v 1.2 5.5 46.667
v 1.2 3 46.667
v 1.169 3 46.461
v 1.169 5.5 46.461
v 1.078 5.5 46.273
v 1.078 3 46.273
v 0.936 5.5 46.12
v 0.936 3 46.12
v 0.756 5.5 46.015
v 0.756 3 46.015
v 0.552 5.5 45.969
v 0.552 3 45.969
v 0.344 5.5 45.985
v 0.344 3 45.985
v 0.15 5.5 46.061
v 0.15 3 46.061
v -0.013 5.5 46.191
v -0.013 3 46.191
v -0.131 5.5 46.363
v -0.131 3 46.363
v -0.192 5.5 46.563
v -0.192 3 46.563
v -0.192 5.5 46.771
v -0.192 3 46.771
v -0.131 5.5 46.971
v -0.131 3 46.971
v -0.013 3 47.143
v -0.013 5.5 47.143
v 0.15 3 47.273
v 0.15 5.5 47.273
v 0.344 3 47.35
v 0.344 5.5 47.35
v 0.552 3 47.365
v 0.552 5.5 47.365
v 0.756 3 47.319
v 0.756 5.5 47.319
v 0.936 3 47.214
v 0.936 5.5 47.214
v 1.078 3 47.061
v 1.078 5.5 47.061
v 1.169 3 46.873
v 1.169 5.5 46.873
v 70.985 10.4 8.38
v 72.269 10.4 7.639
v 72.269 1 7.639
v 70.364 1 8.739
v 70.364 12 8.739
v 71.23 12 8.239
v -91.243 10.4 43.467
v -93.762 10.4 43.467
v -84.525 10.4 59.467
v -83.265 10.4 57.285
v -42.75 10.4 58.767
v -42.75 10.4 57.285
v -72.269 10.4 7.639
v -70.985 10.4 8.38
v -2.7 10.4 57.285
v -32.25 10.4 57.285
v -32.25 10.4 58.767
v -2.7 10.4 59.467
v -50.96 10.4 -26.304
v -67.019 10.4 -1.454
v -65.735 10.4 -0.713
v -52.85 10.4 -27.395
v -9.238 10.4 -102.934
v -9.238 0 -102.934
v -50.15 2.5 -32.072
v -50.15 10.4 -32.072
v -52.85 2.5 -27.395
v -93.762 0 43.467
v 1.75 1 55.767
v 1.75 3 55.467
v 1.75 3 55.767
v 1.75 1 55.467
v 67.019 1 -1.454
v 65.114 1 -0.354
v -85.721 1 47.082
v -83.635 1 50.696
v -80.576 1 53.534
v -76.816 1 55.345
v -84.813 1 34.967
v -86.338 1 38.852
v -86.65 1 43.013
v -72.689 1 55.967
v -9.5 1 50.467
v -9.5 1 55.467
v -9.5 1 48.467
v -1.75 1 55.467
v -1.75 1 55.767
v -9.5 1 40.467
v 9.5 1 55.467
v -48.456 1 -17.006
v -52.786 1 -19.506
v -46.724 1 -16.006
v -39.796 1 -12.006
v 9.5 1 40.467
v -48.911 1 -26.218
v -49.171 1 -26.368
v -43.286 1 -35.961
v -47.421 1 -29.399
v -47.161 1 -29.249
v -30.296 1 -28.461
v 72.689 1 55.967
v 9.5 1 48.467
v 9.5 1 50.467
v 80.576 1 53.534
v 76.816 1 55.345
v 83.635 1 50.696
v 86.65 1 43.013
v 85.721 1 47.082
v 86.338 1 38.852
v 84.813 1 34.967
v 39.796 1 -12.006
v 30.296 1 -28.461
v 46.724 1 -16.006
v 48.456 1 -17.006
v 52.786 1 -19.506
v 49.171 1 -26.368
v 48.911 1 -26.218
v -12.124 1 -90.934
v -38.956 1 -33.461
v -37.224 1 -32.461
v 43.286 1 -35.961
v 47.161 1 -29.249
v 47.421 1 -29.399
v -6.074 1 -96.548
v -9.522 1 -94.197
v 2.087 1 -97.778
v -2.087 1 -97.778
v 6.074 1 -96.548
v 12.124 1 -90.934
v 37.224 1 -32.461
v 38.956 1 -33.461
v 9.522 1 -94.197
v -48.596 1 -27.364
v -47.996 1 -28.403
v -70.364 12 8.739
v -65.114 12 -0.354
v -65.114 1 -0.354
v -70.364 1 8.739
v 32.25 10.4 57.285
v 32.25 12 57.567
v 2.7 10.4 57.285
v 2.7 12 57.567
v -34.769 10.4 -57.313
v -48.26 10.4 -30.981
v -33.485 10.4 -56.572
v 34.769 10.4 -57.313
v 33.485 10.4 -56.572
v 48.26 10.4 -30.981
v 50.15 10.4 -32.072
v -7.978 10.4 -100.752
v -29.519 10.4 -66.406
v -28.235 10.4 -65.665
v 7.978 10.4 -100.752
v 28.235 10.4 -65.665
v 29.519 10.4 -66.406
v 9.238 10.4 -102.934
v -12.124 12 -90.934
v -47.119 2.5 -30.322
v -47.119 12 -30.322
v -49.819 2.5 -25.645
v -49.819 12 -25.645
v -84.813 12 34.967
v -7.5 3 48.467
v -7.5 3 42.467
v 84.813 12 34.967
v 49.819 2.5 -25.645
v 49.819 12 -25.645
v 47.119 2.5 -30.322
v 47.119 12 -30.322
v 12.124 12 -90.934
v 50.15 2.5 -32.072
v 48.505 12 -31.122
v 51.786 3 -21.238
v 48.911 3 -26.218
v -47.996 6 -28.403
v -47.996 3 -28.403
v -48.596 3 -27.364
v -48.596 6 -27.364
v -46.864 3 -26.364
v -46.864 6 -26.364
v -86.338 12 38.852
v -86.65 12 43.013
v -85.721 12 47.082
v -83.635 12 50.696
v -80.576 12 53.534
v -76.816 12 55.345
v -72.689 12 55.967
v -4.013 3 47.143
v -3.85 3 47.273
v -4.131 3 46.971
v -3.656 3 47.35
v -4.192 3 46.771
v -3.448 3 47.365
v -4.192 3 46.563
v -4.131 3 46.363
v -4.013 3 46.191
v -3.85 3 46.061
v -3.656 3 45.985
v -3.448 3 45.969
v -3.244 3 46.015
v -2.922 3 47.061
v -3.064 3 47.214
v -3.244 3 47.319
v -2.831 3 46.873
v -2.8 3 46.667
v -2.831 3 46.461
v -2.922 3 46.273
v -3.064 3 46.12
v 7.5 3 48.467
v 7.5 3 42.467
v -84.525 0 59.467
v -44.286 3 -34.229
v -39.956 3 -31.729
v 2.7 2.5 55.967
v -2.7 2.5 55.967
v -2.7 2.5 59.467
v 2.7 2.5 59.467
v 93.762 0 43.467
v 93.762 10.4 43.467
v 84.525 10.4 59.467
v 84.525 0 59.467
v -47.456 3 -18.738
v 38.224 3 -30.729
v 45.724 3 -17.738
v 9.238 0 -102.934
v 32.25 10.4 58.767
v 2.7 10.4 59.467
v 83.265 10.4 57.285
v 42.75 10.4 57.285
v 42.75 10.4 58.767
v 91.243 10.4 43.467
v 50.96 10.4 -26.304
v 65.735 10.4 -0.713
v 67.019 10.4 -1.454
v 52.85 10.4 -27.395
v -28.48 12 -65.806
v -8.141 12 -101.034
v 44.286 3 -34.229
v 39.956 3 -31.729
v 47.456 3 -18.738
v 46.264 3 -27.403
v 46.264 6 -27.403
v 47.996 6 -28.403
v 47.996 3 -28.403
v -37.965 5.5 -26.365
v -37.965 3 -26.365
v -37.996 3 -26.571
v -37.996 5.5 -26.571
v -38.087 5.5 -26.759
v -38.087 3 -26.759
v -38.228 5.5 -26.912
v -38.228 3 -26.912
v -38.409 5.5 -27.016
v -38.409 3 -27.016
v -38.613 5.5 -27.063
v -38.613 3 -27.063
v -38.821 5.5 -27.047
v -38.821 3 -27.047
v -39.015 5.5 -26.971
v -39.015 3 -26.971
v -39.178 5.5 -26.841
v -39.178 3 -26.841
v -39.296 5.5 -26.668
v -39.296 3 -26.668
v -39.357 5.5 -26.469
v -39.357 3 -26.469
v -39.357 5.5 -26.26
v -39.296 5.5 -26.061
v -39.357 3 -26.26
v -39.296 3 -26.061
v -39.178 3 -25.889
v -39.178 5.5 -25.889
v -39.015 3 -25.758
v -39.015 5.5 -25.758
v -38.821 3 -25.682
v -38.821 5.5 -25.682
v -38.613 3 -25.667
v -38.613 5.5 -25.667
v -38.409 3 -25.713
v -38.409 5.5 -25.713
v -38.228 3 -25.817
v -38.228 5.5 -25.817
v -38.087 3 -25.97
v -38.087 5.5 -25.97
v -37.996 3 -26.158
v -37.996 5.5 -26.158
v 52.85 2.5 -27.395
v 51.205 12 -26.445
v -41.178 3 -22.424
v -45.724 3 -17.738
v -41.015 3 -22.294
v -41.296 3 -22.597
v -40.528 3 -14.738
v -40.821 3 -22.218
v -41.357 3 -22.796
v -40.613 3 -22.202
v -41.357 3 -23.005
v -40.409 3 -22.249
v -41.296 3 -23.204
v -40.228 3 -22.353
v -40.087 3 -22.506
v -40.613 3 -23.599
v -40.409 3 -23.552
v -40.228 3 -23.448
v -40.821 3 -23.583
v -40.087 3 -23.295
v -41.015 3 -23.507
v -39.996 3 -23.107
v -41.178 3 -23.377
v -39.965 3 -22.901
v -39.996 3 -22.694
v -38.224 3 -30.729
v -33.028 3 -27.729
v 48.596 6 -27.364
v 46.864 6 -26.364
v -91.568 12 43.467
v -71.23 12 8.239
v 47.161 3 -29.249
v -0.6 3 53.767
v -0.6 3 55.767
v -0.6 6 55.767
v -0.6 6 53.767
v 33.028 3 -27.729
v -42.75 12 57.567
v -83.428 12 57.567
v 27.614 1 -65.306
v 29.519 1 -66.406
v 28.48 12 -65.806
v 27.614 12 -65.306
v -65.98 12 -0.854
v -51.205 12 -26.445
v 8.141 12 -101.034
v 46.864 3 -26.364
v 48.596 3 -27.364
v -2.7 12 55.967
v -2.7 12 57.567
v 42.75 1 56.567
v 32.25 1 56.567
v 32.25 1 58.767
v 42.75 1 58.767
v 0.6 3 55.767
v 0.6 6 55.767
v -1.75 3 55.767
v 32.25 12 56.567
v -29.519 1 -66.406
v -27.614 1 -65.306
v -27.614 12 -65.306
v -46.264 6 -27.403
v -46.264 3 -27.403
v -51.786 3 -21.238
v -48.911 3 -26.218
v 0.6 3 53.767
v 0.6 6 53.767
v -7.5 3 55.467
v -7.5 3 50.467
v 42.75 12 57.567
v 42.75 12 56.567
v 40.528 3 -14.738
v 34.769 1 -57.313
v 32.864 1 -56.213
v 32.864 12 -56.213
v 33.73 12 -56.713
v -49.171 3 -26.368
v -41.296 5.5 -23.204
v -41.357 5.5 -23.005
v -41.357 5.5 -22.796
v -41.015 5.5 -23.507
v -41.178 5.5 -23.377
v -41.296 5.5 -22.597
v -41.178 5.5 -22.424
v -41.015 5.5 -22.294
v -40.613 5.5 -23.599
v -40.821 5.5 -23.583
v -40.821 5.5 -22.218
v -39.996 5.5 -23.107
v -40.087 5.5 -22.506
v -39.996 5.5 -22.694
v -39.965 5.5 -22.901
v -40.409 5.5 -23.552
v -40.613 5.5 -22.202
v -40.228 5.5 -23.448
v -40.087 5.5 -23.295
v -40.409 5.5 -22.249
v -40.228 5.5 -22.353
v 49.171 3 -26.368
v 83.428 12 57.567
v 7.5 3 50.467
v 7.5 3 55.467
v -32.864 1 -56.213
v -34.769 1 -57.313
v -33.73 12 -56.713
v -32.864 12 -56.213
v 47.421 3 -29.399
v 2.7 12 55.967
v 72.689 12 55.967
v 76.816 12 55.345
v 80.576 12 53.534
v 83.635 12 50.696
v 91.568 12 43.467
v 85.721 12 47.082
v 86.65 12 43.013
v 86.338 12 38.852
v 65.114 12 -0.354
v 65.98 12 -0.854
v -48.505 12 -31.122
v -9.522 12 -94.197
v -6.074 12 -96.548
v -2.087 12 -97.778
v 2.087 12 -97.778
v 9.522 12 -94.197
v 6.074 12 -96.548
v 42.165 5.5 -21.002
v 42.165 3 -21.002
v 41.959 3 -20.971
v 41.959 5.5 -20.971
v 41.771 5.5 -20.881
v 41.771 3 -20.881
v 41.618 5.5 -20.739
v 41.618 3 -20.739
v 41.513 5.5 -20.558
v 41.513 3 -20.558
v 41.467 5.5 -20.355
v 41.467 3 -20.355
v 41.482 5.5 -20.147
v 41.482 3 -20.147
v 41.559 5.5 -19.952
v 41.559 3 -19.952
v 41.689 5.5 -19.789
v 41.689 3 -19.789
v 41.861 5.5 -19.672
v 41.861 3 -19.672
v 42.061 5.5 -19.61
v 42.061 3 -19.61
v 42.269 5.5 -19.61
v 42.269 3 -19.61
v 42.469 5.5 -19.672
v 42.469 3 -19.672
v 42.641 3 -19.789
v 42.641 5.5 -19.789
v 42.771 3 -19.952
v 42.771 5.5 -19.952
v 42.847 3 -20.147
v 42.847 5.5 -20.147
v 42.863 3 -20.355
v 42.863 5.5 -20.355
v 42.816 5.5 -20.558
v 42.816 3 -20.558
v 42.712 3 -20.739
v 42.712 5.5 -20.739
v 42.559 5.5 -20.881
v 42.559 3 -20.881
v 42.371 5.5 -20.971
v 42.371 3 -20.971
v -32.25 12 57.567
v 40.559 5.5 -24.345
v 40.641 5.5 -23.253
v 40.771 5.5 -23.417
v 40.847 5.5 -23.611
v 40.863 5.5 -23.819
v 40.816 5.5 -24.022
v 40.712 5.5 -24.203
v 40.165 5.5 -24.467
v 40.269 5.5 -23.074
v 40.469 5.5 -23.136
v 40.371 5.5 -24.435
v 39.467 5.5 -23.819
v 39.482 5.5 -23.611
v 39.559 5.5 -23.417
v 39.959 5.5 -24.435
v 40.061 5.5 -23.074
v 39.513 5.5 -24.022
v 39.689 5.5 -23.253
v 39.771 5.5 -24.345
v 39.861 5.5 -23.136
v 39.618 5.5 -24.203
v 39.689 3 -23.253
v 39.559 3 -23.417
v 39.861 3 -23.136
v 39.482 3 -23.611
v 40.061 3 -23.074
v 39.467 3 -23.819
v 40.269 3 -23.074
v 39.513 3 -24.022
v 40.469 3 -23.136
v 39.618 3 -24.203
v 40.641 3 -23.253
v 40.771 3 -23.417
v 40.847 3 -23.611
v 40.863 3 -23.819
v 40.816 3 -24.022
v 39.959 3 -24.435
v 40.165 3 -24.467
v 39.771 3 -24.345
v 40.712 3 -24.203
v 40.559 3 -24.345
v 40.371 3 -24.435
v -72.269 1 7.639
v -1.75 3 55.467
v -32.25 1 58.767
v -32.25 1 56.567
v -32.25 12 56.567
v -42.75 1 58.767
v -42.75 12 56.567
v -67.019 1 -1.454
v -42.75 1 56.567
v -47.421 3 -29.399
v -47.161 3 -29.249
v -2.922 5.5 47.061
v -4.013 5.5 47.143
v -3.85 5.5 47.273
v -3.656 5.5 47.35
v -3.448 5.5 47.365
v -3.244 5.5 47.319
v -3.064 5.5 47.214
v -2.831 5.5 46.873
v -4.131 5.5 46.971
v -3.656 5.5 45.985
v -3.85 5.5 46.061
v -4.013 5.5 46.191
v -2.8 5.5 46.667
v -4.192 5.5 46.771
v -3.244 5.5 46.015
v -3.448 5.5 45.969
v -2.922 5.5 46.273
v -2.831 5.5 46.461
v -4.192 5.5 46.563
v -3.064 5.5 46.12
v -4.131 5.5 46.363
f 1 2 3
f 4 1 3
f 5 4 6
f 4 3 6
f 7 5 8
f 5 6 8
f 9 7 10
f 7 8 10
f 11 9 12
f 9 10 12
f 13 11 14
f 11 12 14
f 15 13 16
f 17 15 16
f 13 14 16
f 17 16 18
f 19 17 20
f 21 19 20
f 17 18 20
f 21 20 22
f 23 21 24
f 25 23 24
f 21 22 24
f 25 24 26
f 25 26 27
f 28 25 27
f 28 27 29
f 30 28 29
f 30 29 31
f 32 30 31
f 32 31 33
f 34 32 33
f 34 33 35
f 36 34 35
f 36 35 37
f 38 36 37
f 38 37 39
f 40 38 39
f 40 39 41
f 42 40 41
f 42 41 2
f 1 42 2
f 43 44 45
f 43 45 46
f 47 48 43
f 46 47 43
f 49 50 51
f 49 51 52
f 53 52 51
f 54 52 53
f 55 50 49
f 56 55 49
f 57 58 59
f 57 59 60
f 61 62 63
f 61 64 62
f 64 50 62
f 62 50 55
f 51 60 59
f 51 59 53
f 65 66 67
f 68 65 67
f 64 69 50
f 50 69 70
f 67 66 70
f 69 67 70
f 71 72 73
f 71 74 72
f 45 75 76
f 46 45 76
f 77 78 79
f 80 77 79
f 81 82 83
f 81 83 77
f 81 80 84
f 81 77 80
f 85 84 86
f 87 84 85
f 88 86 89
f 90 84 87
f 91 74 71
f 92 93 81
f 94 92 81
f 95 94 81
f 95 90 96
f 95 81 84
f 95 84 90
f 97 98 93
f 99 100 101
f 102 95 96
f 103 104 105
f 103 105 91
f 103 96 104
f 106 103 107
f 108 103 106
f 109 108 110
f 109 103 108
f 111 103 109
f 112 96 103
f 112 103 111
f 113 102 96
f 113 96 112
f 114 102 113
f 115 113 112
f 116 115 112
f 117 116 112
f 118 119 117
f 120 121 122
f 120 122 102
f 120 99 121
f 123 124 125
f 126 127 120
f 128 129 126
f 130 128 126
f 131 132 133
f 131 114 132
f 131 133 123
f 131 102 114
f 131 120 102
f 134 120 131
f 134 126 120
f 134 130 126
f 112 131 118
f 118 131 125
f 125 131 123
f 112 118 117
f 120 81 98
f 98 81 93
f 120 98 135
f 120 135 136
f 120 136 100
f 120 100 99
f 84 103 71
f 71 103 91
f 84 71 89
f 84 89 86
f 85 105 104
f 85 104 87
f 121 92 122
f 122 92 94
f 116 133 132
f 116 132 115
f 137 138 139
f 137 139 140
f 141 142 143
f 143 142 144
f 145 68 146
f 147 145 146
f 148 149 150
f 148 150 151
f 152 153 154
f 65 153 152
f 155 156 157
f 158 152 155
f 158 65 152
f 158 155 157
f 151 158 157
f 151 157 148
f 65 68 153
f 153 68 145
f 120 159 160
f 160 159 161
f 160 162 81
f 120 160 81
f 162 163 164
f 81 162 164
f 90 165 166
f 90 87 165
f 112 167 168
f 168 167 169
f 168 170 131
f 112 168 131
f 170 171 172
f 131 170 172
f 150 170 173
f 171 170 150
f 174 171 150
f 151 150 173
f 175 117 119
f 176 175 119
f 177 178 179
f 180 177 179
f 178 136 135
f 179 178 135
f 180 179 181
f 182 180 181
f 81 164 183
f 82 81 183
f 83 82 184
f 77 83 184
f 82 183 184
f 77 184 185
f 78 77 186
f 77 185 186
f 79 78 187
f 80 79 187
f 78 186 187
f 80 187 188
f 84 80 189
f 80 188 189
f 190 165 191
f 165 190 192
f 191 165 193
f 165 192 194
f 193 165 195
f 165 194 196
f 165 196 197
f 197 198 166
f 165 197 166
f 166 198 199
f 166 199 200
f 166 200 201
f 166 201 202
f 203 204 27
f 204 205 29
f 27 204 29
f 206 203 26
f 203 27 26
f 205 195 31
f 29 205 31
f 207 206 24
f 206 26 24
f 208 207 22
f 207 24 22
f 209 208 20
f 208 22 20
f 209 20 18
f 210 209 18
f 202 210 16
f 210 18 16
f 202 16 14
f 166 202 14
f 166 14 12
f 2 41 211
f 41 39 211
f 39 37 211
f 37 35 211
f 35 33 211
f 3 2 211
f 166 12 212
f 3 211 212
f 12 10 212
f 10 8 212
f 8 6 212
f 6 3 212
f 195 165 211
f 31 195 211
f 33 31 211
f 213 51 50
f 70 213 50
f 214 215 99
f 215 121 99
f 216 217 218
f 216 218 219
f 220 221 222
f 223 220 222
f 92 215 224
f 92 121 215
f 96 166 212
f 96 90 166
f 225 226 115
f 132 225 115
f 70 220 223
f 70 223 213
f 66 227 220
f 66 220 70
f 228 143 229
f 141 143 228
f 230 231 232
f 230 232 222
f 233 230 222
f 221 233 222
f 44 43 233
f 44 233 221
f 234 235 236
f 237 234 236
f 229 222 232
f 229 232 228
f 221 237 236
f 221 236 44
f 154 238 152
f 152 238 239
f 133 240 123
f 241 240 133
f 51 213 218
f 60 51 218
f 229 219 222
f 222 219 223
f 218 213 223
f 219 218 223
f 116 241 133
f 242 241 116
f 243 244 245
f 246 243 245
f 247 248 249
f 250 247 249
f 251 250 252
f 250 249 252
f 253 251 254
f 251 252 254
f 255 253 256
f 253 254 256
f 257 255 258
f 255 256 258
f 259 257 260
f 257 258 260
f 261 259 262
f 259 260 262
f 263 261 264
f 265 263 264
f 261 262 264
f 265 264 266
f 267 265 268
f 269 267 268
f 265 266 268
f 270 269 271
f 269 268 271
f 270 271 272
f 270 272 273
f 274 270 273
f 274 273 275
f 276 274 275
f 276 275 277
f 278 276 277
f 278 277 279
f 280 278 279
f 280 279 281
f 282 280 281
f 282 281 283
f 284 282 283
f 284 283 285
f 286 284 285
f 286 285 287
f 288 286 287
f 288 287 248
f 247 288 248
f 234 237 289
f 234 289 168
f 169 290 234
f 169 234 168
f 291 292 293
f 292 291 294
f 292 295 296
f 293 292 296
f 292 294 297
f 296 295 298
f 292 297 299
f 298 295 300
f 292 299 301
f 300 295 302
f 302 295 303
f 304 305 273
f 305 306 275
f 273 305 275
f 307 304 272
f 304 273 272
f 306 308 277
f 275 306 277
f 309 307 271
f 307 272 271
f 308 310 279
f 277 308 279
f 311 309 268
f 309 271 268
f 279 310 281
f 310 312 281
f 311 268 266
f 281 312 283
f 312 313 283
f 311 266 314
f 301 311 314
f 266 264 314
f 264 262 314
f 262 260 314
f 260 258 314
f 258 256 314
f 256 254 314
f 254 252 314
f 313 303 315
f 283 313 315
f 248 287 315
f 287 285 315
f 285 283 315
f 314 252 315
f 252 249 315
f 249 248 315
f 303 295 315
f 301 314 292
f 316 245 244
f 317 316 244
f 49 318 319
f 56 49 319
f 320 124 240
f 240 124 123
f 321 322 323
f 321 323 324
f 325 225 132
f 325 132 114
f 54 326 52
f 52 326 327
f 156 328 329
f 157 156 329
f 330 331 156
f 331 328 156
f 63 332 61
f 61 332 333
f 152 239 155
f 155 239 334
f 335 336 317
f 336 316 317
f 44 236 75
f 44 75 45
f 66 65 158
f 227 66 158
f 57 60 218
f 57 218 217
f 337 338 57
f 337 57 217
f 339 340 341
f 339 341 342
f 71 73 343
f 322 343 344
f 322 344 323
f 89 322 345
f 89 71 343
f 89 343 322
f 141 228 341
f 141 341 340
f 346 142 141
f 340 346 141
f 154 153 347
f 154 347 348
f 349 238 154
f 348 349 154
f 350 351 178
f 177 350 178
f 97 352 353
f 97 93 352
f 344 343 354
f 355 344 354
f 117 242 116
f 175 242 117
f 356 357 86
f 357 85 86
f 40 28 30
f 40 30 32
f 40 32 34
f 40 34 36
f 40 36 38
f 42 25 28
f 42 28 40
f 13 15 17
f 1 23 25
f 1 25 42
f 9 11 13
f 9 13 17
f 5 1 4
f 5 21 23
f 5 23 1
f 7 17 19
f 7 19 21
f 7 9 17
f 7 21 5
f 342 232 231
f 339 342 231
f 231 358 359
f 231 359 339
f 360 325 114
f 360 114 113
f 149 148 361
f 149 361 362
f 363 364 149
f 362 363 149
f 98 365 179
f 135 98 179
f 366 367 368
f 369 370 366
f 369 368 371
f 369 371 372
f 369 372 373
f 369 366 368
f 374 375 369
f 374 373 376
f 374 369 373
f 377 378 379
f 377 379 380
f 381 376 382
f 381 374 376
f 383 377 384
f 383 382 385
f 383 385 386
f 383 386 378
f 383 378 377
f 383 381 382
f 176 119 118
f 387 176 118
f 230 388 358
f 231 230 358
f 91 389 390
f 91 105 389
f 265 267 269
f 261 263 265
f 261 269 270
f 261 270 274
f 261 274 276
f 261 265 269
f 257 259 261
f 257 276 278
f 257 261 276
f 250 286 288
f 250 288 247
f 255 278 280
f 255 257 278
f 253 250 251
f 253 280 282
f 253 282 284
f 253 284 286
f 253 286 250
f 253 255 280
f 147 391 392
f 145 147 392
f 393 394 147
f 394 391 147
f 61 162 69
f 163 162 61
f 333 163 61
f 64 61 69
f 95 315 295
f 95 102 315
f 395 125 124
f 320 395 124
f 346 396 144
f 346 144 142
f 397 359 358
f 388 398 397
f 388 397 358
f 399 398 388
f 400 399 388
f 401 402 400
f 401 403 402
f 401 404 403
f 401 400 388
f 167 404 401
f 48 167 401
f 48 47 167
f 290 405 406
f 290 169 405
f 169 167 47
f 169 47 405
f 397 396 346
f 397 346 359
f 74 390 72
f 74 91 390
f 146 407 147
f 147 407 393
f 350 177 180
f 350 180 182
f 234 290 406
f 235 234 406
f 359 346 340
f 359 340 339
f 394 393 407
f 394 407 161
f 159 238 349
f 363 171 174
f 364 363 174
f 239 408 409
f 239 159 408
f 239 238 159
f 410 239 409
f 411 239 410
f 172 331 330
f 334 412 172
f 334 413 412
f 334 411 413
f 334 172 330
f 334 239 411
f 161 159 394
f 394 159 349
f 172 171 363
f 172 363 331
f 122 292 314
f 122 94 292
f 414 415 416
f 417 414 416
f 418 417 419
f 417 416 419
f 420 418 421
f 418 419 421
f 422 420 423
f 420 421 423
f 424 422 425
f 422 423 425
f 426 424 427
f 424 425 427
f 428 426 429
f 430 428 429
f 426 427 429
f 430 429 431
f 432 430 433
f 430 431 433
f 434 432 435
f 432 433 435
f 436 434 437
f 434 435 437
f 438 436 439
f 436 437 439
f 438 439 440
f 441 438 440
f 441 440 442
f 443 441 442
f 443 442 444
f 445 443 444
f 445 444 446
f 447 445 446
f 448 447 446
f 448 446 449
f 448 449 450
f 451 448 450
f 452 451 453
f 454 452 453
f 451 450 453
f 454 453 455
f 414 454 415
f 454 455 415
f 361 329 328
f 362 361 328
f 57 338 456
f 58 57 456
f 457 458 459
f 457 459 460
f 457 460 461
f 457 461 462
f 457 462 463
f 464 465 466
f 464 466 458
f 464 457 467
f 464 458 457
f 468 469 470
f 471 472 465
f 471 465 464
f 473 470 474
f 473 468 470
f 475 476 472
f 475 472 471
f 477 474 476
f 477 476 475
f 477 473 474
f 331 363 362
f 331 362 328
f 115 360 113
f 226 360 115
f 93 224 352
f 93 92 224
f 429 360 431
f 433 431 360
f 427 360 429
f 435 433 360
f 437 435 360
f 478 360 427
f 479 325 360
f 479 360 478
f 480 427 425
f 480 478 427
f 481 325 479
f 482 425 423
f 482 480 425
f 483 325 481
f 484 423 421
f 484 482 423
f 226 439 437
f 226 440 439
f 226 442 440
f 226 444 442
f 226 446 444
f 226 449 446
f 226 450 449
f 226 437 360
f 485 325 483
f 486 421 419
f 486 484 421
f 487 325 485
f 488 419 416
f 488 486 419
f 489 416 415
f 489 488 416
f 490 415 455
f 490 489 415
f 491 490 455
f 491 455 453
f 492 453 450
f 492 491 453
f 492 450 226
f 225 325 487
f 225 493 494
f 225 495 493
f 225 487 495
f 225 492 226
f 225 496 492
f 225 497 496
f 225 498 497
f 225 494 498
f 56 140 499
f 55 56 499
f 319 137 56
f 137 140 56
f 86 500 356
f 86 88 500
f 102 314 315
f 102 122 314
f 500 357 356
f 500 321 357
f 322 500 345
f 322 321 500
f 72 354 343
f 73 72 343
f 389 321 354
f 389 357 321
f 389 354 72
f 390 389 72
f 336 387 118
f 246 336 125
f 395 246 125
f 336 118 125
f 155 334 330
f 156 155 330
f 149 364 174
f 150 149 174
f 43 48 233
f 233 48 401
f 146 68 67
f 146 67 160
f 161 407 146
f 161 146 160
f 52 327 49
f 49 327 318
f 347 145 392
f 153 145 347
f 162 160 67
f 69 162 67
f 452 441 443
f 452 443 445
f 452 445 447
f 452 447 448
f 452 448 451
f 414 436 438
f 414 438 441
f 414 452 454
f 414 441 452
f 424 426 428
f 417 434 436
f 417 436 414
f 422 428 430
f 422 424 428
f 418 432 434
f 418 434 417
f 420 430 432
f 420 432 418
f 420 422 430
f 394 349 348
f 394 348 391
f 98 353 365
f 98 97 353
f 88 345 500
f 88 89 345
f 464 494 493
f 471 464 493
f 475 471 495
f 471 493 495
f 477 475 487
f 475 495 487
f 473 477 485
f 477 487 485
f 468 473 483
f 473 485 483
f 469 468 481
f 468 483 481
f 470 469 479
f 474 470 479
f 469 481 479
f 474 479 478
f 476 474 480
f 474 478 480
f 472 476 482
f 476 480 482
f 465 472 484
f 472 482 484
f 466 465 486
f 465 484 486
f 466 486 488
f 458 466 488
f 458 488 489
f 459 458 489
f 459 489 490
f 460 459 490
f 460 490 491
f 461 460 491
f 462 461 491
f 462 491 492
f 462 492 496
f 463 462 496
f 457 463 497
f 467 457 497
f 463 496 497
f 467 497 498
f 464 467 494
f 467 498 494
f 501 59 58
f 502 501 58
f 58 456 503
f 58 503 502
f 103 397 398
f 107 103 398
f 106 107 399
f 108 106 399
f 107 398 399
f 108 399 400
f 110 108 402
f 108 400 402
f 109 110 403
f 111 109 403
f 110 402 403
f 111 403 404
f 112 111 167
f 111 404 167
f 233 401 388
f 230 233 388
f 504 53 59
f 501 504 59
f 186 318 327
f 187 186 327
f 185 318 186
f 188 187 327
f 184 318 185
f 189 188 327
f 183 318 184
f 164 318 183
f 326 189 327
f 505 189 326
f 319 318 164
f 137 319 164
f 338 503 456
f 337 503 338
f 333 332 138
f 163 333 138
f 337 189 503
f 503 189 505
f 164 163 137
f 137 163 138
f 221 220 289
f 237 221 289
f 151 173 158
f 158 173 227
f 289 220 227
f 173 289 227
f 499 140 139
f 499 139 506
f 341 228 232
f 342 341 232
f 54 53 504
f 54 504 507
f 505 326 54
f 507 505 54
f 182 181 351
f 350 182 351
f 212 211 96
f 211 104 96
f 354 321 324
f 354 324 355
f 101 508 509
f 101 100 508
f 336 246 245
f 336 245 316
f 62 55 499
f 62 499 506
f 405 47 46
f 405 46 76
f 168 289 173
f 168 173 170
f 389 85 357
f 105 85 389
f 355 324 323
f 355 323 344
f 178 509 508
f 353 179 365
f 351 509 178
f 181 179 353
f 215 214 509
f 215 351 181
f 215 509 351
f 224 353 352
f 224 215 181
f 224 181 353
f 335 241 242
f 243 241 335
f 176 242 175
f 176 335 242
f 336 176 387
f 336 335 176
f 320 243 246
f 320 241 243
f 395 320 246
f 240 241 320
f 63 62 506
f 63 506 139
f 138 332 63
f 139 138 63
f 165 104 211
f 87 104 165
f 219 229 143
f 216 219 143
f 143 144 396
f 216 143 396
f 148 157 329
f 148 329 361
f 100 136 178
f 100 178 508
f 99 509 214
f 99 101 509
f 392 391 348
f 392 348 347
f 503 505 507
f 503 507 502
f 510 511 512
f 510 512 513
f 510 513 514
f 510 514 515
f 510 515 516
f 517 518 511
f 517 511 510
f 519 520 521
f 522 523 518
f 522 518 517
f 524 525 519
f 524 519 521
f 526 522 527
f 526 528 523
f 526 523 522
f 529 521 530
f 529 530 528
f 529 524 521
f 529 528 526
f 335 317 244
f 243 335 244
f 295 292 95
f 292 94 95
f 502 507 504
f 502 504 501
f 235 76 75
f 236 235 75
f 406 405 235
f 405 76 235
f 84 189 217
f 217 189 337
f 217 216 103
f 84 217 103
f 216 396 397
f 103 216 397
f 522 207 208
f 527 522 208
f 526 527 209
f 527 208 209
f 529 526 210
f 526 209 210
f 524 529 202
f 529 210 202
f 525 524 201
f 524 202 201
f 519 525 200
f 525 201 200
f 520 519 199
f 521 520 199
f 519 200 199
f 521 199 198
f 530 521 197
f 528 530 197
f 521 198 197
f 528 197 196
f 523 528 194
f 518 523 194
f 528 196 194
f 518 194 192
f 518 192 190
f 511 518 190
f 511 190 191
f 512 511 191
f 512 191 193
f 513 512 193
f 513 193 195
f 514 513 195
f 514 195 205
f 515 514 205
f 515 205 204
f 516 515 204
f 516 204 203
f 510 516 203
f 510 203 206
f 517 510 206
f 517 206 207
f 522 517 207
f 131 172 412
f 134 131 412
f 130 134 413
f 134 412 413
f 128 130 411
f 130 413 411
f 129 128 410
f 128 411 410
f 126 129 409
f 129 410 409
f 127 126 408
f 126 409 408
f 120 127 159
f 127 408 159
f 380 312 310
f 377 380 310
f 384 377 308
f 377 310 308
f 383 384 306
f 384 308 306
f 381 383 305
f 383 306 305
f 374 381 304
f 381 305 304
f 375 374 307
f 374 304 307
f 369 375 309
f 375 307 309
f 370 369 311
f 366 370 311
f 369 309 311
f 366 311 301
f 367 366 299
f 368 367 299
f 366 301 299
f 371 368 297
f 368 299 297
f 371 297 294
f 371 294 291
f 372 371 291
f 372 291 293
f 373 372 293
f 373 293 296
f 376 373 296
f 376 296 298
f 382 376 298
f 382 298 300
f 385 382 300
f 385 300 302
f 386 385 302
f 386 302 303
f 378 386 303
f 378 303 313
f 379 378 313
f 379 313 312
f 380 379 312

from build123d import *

# Parameters (mm, degrees)
BOSS_EXTRU_1_DEPTH                        = 12
ENL_V_MAT_EXTRU_1_DEPTH                   = 158.792057257
ENL_V_MAT_EXTRU_2_DEPTH                   = 11
ESQUISSE4_W                               = 5.4
ESQUISSE4_H                               = 3.5
ENL_V_MAT_EXTRU_3_DEPTH                   = 9.5
BOSS_EXTRU_2_DEPTH                        = 2
ESQUISSE13_R                              = 0.7
BOSS_EXTRU_3_DEPTH                        = 2.5
BOSS_EXTRU_8_DEPTH                        = 3
CHANFREIN4_SIZE                           = 2
ENL_V_MAT_EXTRU_11_DEPTH                  = 2
R_P_TITION_START                          = 1
R_P_TITION_CIRCULAIRE1_OUTLINE_W          = 1.2
R_P_TITION_CIRCULAIRE1_OUTLINE_H          = 2
R_P_TITION_CIRCULAIRE1_OUTLINE_R          = 0.7
R_P_TITION_CIRCULAIRE1_DEPTH              = 4.5
R_P_TITION_START_2                        = 5.5
R_P_TITION_CIRCULAIRE1_2_OUTLINE_W        = 1.2
R_P_TITION_CIRCULAIRE1_2_OUTLINE_H        = 2
R_P_TITION_CIRCULAIRE1_2_DEPTH            = 0.5
ENL_V_DE_MAT_EXTRU_MINCE1_DEPTH           = 1.6
ENL_V_DE_MAT_EXTRU_MINCE1_DRAFT           = 10
ENL_V_DE_MAT_EXTRU_MINCE1_PROFILE_2_DEPTH = 1.6
ENL_V_DE_MAT_EXTRU_MINCE1_PROFILE_2_DRAFT = 10
ENL_V_DE_MAT_EXTRU_MINCE1_PROFILE_3_DEPTH = 1.6
ENL_V_DE_MAT_EXTRU_MINCE1_PROFILE_3_DRAFT = 10
ESQUISSE18_W                              = 10.5
ESQUISSE18_H                              = 2.2
ENL_V_MAT_EXTRU_10_DEPTH                  = 11


with BuildPart() as part:
    # Esquisse1 → Boss.-Extru.1 (new body)
    with BuildSketch(Plane(origin=(0, 0, 0), x_dir=(1, 0, 0), z_dir=(0, 1, 0))):
        Polygon((-103, -59.467077727), (103, -59.467077727), (0, 118.934155453), align=None)
    extrude(amount=BOSS_EXTRU_1_DEPTH)

    # Esquisse2 → Enlèv. mat.-Extru.1 (cut, through all)
    with BuildSketch(Plane(origin=(0, 12, 0), x_dir=(1, 0, 0), z_dir=(0, 1, 0))):
        Polygon((-9.237604307, 102.934155453), (9.237604307, 102.934155453), (0, 118.934155453), align=None)
        Polygon((103, -59.467077727), (93.762395693, -43.467077727), (84.524791386, -59.467077727), align=None)
        Polygon((-103, -59.467077727), (-84.524791386, -59.467077727), (-93.762395693, -43.467077727), align=None)
    extrude(amount=-ENL_V_MAT_EXTRU_1_DEPTH, mode=Mode.SUBTRACT)

    # Esquisse3 → Enlèv. mat.-Extru.2 (cut)
    with BuildSketch(Plane(origin=(0, 12, 0), x_dir=(1, 0, 0), z_dir=(0, 1, 0))):
        with BuildLine():
            Line((84.813466521, -34.967077727), (12.124355653, 90.934155453))
            ThreePointArc((12.124355653, 90.934155453), (0, 97.934155453), (-12.124355653, 90.934155453))
            Line((-12.124355653, 90.934155453), (-84.813466521, -34.967077727))
            ThreePointArc((-84.813466521, -34.967077727), (-84.813466521, -48.967077727), (-72.689110868, -55.967077727))
            Line((-72.689110868, -55.967077727), (72.689110868, -55.967077727))
            ThreePointArc((72.689110868, -55.967077727), (84.813466521, -48.967077727), (84.813466521, -34.967077727))
        make_face()
    extrude(amount=-ENL_V_MAT_EXTRU_2_DEPTH, mode=Mode.SUBTRACT)

    # Esquisse4 → Enlèv. mat.-Extru.3 (cut)
    with BuildSketch(Plane(origin=(0, 12, 0), x_dir=(1, 0, 0), z_dir=(0, 1, 0))):
        Polygon((49.818911087, 25.645270273), (47.118911087, 30.321807453), (50.15, 32.071807453), (52.85, 27.395270273), align=None)
        with Locations((0, -57.717077727)):
            Rectangle(ESQUISSE4_W, ESQUISSE4_H)
        Polygon((-50.15, 32.071807453), (-47.118911087, 30.321807453), (-49.818911087, 25.645270273), (-52.85, 27.395270273), align=None)
    extrude(amount=-ENL_V_MAT_EXTRU_3_DEPTH, mode=Mode.SUBTRACT)

    # Esquisse12 → Boss.-Extru.2 (add)
    with BuildSketch(Plane(origin=(0, 1, 0), x_dir=(1, 0, 0), z_dir=(0, 1, 0))):
        Polygon((33.027568136, 27.728729392), (40.527568136, 14.738348335), (51.785898385, 21.238348335), (48.910898385, 26.217994407), (49.170706006, 26.367994407), (47.420706006, 29.39908332), (47.160898385, 29.24908332), (44.285898385, 34.228729392), align=None)
    extrude(amount=BOSS_EXTRU_2_DEPTH)

    # Esquisse13 → Boss.-Extru.3 (add)
    with BuildSketch(Plane(origin=(0, 3, 0), x_dir=(1, 0, 0), z_dir=(0, 1, 0))):
        with Locations(Location((40.164874832, 23.766551565, 0), (0, 0, 90))):
            Circle(ESQUISSE13_R)
        with Locations(Location((42.164874832, 20.30244995, 0), (0, 0, 90))):
            Circle(ESQUISSE13_R)
    extrude(amount=BOSS_EXTRU_3_DEPTH)

    # Esquisse20 → Boss.-Extru.8 (add, symmetric)
    with BuildSketch(Plane(origin=(0, 3, 0), x_dir=(1, 0, 0), z_dir=(0, 1, 0))):
        Polygon((47.995706006, 28.403154106), (48.595706006, 27.363923621), (46.863655198, 26.363923621), (46.263655198, 27.403154106), align=None)
    extrude(amount=BOSS_EXTRU_8_DEPTH, both=True)

    # Chanfrein4
    chanfrein4_edges = [part.edges().sort_by_distance(p)[0] for p in [
        (38.65673326, 1, -30.978729392),
        (36.777568136, 1, -21.233538863),
        (46.15673326, 1, -17.988348335),
    ]]
    chamfer(chanfrein4_edges, length=CHANFREIN4_SIZE - 0.0001)  # a hair under: the kernel refuses the full size

    # Esquisse21 → Enlèv. mat.-Extru.11 (cut)
    with BuildSketch(Plane(origin=(0, 3, 0), x_dir=(1, 0, 0), z_dir=(0, 1, 0))):
        Polygon((37.223720558, 32.460780199), (38.955771366, 33.460780199), (48.455771366, 17.006297527), (46.723720558, 16.006297527), align=None)
    extrude(amount=-ENL_V_MAT_EXTRU_11_DEPTH, mode=Mode.SUBTRACT)

    # Répétition circulaire1: read off the stored shape, not the designer's step
    # Répétition circulaire1 outline → Répétition circulaire1 (add)
    with BuildSketch(Plane(origin=(0, 0, 0), x_dir=(1, 0, 0), z_dir=(0, 1, 0)).offset(R_P_TITION_START)):
        Polygon((-47.995706006, 28.403154106), (-48.595706006, 27.363923621), (-46.863655198, 26.363923621), (-46.263655198, 27.403154106), align=None)
        with Locations((0, -54.767077727)):
            Rectangle(R_P_TITION_CIRCULAIRE1_OUTLINE_W, R_P_TITION_CIRCULAIRE1_OUTLINE_H)
        with Locations((-40.664874832, 22.900526161)):
            Circle(R_P_TITION_CIRCULAIRE1_OUTLINE_R)
        with Locations((-38.664874832, 26.364627777)):
            Circle(R_P_TITION_CIRCULAIRE1_OUTLINE_R)
        with Locations((0.5, -46.667077727)):
            Circle(R_P_TITION_CIRCULAIRE1_OUTLINE_R)
        with Locations((-3.5, -46.667077727)):
            Circle(R_P_TITION_CIRCULAIRE1_OUTLINE_R)
    extrude(amount=R_P_TITION_CIRCULAIRE1_DEPTH)

    # R_p_tition circulaire1 2 outline → R_p_tition circulaire1 2 (add)
    with BuildSketch(Plane(origin=(0, 0, 0), x_dir=(1, 0, 0), z_dir=(0, 1, 0)).offset(R_P_TITION_START_2)):
        Polygon((-47.995706006, 28.403154106), (-48.595706006, 27.363923621), (-46.863655198, 26.363923621), (-46.263655198, 27.403154106), align=None)
        with Locations((0, -54.767077727)):
            Rectangle(R_P_TITION_CIRCULAIRE1_2_OUTLINE_W, R_P_TITION_CIRCULAIRE1_2_OUTLINE_H)
    extrude(amount=R_P_TITION_CIRCULAIRE1_2_DEPTH)

    # R_p_tition circulaire1 3: loft between two sections, ruled curve by curve
    r_p_tition_circulaire1_3_from = [
        Edge.make_line((-38.223720558, 3, -30.728729392), (-33.027568136, 3, -27.728729392)),
        Edge.make_line((-45.723720558, 3, -17.738348335), (-40.527568136, 3, -14.738348335)),
        Edge.make_line((-33.027568136, 3, -27.728729392), (-40.527568136, 3, -14.738348335)),
        Edge.make_line((-45.723720558, 3, -17.738348335), (-38.223720558, 3, -30.728729392)),
    ]
    r_p_tition_circulaire1_3_to = [
        Edge.make_line((-37.223720558, 1, -32.460780199), (-30.295517328, 1, -28.460780199)),
        Edge.make_line((-46.723720558, 1, -16.006297527), (-39.795517328, 1, -12.006297527)),
        Edge.make_line((-30.295517328, 1, -28.460780199), (-39.795517328, 1, -12.006297527)),
        Edge.make_line((-46.723720558, 1, -16.006297527), (-37.223720558, 1, -32.460780199)),
    ]
    r_p_tition_circulaire1_3 = Solid(Shell([*[Face.make_surface_from_curves(r_p_tition_circulaire1_3_from[k], r_p_tition_circulaire1_3_to[k]) for k in range(4)], Face(Wire(r_p_tition_circulaire1_3_from)), Face(Wire(r_p_tition_circulaire1_3_to))]))
    add(r_p_tition_circulaire1_3)

    # R_p_tition circulaire1 4: loft between two sections, ruled curve by curve
    r_p_tition_circulaire1_4_from = [
        Edge.make_line((-7.5, 3, 48.467077727), (-7.5, 3, 42.467077727)),
        Edge.make_line((7.5, 3, 48.467077727), (7.5, 3, 42.467077727)),
        Edge.make_line((-7.5, 3, 42.467077727), (7.5, 3, 42.467077727)),
        Edge.make_line((7.5, 3, 48.467077727), (-7.5, 3, 48.467077727)),
    ]
    r_p_tition_circulaire1_4_to = [
        Edge.make_line((-9.5, 1, 48.467077727), (-9.5, 1, 40.467077727)),
        Edge.make_line((9.5, 1, 48.467077727), (9.5, 1, 40.467077727)),
        Edge.make_line((-9.5, 1, 40.467077727), (9.5, 1, 40.467077727)),
        Edge.make_line((9.5, 1, 48.467077727), (-9.5, 1, 48.467077727)),
    ]
    r_p_tition_circulaire1_4 = Solid(Shell([*[Face.make_surface_from_curves(r_p_tition_circulaire1_4_from[k], r_p_tition_circulaire1_4_to[k]) for k in range(4)], Face(Wire(r_p_tition_circulaire1_4_from)), Face(Wire(r_p_tition_circulaire1_4_to))]))
    add(r_p_tition_circulaire1_4)

    # R_p_tition circulaire1 5: loft between two sections, ruled curve by curve
    r_p_tition_circulaire1_5_from = [
        Edge.make_line((-39.955771366, 3, -31.728729392), (-44.285898385, 3, -34.228729392)),
        Edge.make_line((-47.455771366, 3, -18.738348335), (-51.785898385, 3, -21.238348335)),
        Edge.make_line((-47.160898385, 3, -29.24908332), (-44.285898385, 3, -34.228729392)),
        Edge.make_line((-51.785898385, 3, -21.238348335), (-48.910898385, 3, -26.217994407)),
        Edge.make_line((-47.420706006, 3, -29.39908332), (-47.160898385, 3, -29.24908332)),
        Edge.make_line((-48.910898385, 3, -26.217994407), (-49.170706006, 3, -26.367994407)),
        Edge.make_line((-39.955771366, 3, -31.728729392), (-47.455771366, 3, -18.738348335)),
        Edge.make_line((-49.170706006, 3, -26.367994407), (-47.420706006, 3, -29.39908332)),
    ]
    r_p_tition_circulaire1_5_to = [
        Edge.make_line((-38.955771366, 1, -33.460780199), (-43.285898385, 1, -35.960780199)),
        Edge.make_line((-48.455771366, 1, -17.006297527), (-52.785898385, 1, -19.506297527)),
        Edge.make_line((-47.160898385, 1, -29.24908332), (-43.285898385, 1, -35.960780199)),
        Edge.make_line((-52.785898385, 1, -19.506297527), (-48.910898385, 1, -26.217994407)),
        Edge.make_line((-47.420706006, 1, -29.39908332), (-47.160898385, 1, -29.24908332)),
        Edge.make_line((-48.910898385, 1, -26.217994407), (-49.170706006, 1, -26.367994407)),
        Edge.make_line((-38.955771366, 1, -33.460780199), (-48.455771366, 1, -17.006297527)),
        Edge.make_line((-49.170706006, 1, -26.367994407), (-47.420706006, 1, -29.39908332)),
    ]
    r_p_tition_circulaire1_5 = Solid(Shell([*[Face.make_surface_from_curves(r_p_tition_circulaire1_5_from[k], r_p_tition_circulaire1_5_to[k]) for k in range(8)], Face(Wire(r_p_tition_circulaire1_5_from)), Face(Wire(r_p_tition_circulaire1_5_to))]))
    add(r_p_tition_circulaire1_5)

    # R_p_tition circulaire1 6: loft between two sections, ruled curve by curve
    r_p_tition_circulaire1_6_from = [
        Edge.make_line((-7.5, 3, 50.467077727), (-7.5, 3, 55.467077727)),
        Edge.make_line((7.5, 3, 50.467077727), (7.5, 3, 55.467077727)),
        Edge.make_line((-1.75, 3, 55.467077727), (-7.5, 3, 55.467077727)),
        Edge.make_line((7.5, 3, 55.467077727), (1.75, 3, 55.467077727)),
        Edge.make_line((-1.75, 3, 55.767077727), (-1.75, 3, 55.467077727)),
        Edge.make_line((1.75, 3, 55.467077727), (1.75, 3, 55.767077727)),
        Edge.make_line((-7.5, 3, 50.467077727), (7.5, 3, 50.467077727)),
        Edge.make_line((1.75, 3, 55.767077727), (-1.75, 3, 55.767077727)),
    ]
    r_p_tition_circulaire1_6_to = [
        Edge.make_line((-9.5, 1, 50.467077727), (-9.5, 1, 55.467077727)),
        Edge.make_line((9.5, 1, 50.467077727), (9.5, 1, 55.467077727)),
        Edge.make_line((-1.75, 1, 55.467077727), (-9.5, 1, 55.467077727)),
        Edge.make_line((9.5, 1, 55.467077727), (1.75, 1, 55.467077727)),
        Edge.make_line((-1.75, 1, 55.767077727), (-1.75, 1, 55.467077727)),
        Edge.make_line((1.75, 1, 55.467077727), (1.75, 1, 55.767077727)),
        Edge.make_line((-9.5, 1, 50.467077727), (9.5, 1, 50.467077727)),
        Edge.make_line((1.75, 1, 55.767077727), (-1.75, 1, 55.767077727)),
    ]
    r_p_tition_circulaire1_6 = Solid(Shell([*[Face.make_surface_from_curves(r_p_tition_circulaire1_6_from[k], r_p_tition_circulaire1_6_to[k]) for k in range(8)], Face(Wire(r_p_tition_circulaire1_6_from)), Face(Wire(r_p_tition_circulaire1_6_to))]))
    add(r_p_tition_circulaire1_6)


with BuildPart() as enl_v_de_mat_extru_mince1_tool:
    # Esquisse17 → Enlèv. de mat.-Extru.-Mince1 (with draft: the straight prism first)
    with BuildSketch(Plane(origin=(0, 12, 0), x_dir=(1, 0, 0), z_dir=(0, 1, 0))):
        Polygon((50.15, 32.071807453), (9.237604307, 102.934155453), (-9.237604307, 102.934155453), (-50.15, 32.071807453), (-48.504551733, 31.121807453), (-8.140638796, 101.034155453), (8.140638796, 101.034155453), (48.504551733, 31.121807453), align=None)
    extrude(amount=-ENL_V_DE_MAT_EXTRU_MINCE1_DEPTH)
    # Enlèv. de mat.-Extru.-Mince1: the draft: its side faces are tilted about the plane it starts from
    enl_v_de_mat_extru_mince1_sides = [enl_v_de_mat_extru_mince1_tool.faces().sort_by_distance(p)[0] for p in [
        (29.693802154, 11.2, -67.502981453),
        (0, 11.2, -102.934155453),
        (-29.693802154, 11.2, -67.502981453),
        (-49.327275866, 11.2, -31.596807453),
        (-28.322595264, 11.2, -66.077981453),
        (0, 11.2, -101.034155453),
        (28.322595264, 11.2, -66.077981453),
        (49.327275866, 11.2, -31.596807453),
    ]]
    draft(enl_v_de_mat_extru_mince1_sides, Plane(origin=(0, 12, 0), x_dir=(1, 0, 0), z_dir=(0, 1, 0)), ENL_V_DE_MAT_EXTRU_MINCE1_DRAFT)


with BuildPart() as part_1:
    add(part.part)

    # Enlèv. de mat.-Extru.-Mince1: cut by enl_v_de_mat_extru_mince1_tool
    add(enl_v_de_mat_extru_mince1_tool.part, mode=Mode.SUBTRACT)


with BuildPart() as enl_v_de_mat_extru_mince1_profile_2_tool:
    # Esquisse17 → Enlèv. de mat.-Extru.-Mince1 profile 2 (with draft: the straight prism first)
    with BuildSketch(Plane(origin=(0, 12, 0), x_dir=(1, 0, 0), z_dir=(0, 1, 0))):
        Polygon((-52.85, 27.395270273), (-93.762395693, -43.467077727), (-84.524791386, -59.467077727), (-2.7, -59.467077727), (-2.7, -57.567077727), (-83.427825874, -57.567077727), (-91.56846467, -43.467077727), (-51.204551733, 26.445270273), align=None)
    extrude(amount=-ENL_V_DE_MAT_EXTRU_MINCE1_PROFILE_2_DEPTH)
    # Enlèv. de mat.-Extru.-Mince1 profile 2: the draft: its side faces are tilted about the plane it starts from
    enl_v_de_mat_extru_mince1_profile_2_sides = [enl_v_de_mat_extru_mince1_profile_2_tool.faces().sort_by_distance(p)[0] for p in [
        (-73.306197846, 11.2, 8.035903727),
        (-89.143593539, 11.2, 51.467077727),
        (-43.612395693, 11.2, 59.467077727),
        (-2.7, 11.2, 58.517077727),
        (-43.063912937, 11.2, 57.567077727),
        (-87.498145272, 11.2, 50.517077727),
        (-71.386508201, 11.2, 8.510903727),
        (-52.027275866, 11.2, -26.920270273),
    ]]
    draft(enl_v_de_mat_extru_mince1_profile_2_sides, Plane(origin=(0, 12, 0), x_dir=(1, 0, 0), z_dir=(0, 1, 0)), ENL_V_DE_MAT_EXTRU_MINCE1_PROFILE_2_DRAFT)


with BuildPart() as part_2:
    add(part_1.part)

    # Enlèv. de mat.-Extru.-Mince1 profile 2: cut by enl_v_de_mat_extru_mince1_profile_2_tool
    add(enl_v_de_mat_extru_mince1_profile_2_tool.part, mode=Mode.SUBTRACT)


with BuildPart() as enl_v_de_mat_extru_mince1_profile_3_tool:
    # Esquisse17 → Enlèv. de mat.-Extru.-Mince1 profile 3 (with draft: the straight prism first)
    with BuildSketch(Plane(origin=(0, 12, 0), x_dir=(1, 0, 0), z_dir=(0, 1, 0))):
        Polygon((2.7, -59.467077727), (84.524791386, -59.467077727), (93.762395693, -43.467077727), (52.85, 27.395270273), (51.204551733, 26.445270273), (91.56846467, -43.467077727), (83.427825874, -57.567077727), (2.7, -57.567077727), align=None)
    extrude(amount=-ENL_V_DE_MAT_EXTRU_MINCE1_PROFILE_3_DEPTH)
    # Enlèv. de mat.-Extru.-Mince1 profile 3: the draft: its side faces are tilted about the plane it starts from
    enl_v_de_mat_extru_mince1_profile_3_sides = [enl_v_de_mat_extru_mince1_profile_3_tool.faces().sort_by_distance(p)[0] for p in [
        (43.612395693, 11.2, 59.467077727),
        (89.143593539, 11.2, 51.467077727),
        (73.306197846, 11.2, 8.035903727),
        (52.027275866, 11.2, -26.920270273),
        (71.386508201, 11.2, 8.510903727),
        (87.498145272, 11.2, 50.517077727),
        (43.063912937, 11.2, 57.567077727),
        (2.7, 11.2, 58.517077727),
    ]]
    draft(enl_v_de_mat_extru_mince1_profile_3_sides, Plane(origin=(0, 12, 0), x_dir=(1, 0, 0), z_dir=(0, 1, 0)), ENL_V_DE_MAT_EXTRU_MINCE1_PROFILE_3_DRAFT)


with BuildPart() as part_3:
    add(part_2.part)

    # Enlèv. de mat.-Extru.-Mince1 profile 3: cut by enl_v_de_mat_extru_mince1_profile_3_tool
    add(enl_v_de_mat_extru_mince1_profile_3_tool.part, mode=Mode.SUBTRACT)

    # Esquisse18 → Enlèv. mat.-Extru.10 (cut)
    with BuildSketch(Plane(origin=(0, 12, 0), x_dir=(1, 0, 0), z_dir=(0, 1, 0))):
        with Locations((37.5, -57.667077727)):
            Rectangle(ESQUISSE18_W, ESQUISSE18_H)
        with Locations((-37.5, -57.667077727)):
            Rectangle(ESQUISSE18_W, ESQUISSE18_H)
        Polygon((-65.113526329, 0.354219591), (-70.363526329, -8.739047149), (-72.268782217, -7.639047149), (-67.018782217, 1.454219591), align=None)
        Polygon((-32.863526329, 56.212858135), (-34.768782217, 57.312858135), (-29.518782217, 66.406124875), (-27.613526329, 65.306124875), align=None)
        Polygon((32.863526329, 56.212858135), (27.613526329, 65.306124875), (29.518782217, 66.406124875), (34.768782217, 57.312858135), align=None)
        Polygon((65.113526329, 0.354219591), (67.018782217, 1.454219591), (72.268782217, -7.639047149), (70.363526329, -8.739047149), align=None)
    extrude(amount=-ENL_V_MAT_EXTRU_10_DEPTH, mode=Mode.SUBTRACT)


solid = part_3.part
